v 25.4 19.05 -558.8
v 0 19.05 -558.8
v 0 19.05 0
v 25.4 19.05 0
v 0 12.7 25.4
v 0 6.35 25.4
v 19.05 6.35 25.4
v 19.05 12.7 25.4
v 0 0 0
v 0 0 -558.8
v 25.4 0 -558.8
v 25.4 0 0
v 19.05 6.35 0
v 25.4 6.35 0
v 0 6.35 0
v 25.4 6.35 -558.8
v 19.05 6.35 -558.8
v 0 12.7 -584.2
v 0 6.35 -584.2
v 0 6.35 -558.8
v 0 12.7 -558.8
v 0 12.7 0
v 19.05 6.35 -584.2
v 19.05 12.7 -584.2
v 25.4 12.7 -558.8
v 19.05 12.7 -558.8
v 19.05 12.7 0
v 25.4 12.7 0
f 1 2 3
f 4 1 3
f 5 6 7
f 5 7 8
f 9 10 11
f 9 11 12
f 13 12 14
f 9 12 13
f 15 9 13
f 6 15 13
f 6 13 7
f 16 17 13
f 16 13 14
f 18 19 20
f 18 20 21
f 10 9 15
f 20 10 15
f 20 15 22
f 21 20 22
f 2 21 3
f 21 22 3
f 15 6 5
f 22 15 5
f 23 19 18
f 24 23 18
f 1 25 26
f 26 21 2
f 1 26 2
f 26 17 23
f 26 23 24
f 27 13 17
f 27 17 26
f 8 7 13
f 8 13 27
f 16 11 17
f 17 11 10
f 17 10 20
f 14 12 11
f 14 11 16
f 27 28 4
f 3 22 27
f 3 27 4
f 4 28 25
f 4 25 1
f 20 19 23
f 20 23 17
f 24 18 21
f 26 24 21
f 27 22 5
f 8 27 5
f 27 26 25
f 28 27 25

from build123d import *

# Parameters (mm, degrees)
F0_W     = 6.3500026588
F0_H     = 558.8
F0_W_2   = 6.35
F0_H_2   = 25.4
F0_W_3   = 6.3499973412
F1_DEPTH = 25.4
F2_W     = 6.35
F2_H     = 6.35
F3_DEPTH = 609.601


with BuildPart() as f1:
    # F0 (on Right) → F1 (new body)
    with BuildSketch(Plane.YZ):
        with Locations((3.1750013294, -279.4)):
            Rectangle(F0_W, F0_H)
        with Locations((9.5250026588, 12.7)):
            Rectangle(F0_W_2, F0_H_2)
        with Locations((9.5250026588, -279.4)):
            Rectangle(F0_W_2, F0_H)
        with Locations((15.8750013294, -279.4)):
            Rectangle(F0_W_3, F0_H)
        with Locations((9.5250026588, -571.5)):
            Rectangle(F0_W_2, F0_H_2)
    extrude(amount=F1_DEPTH)

    # F2 (on face) → F3 (cut, through all)
    with BuildSketch(Plane.XY.offset(25.4)):
        with Locations((22.225, 9.5250026588)):
            Rectangle(F2_W, F2_H)
    extrude(amount=-F3_DEPTH, mode=Mode.SUBTRACT)


solid = f1.part
